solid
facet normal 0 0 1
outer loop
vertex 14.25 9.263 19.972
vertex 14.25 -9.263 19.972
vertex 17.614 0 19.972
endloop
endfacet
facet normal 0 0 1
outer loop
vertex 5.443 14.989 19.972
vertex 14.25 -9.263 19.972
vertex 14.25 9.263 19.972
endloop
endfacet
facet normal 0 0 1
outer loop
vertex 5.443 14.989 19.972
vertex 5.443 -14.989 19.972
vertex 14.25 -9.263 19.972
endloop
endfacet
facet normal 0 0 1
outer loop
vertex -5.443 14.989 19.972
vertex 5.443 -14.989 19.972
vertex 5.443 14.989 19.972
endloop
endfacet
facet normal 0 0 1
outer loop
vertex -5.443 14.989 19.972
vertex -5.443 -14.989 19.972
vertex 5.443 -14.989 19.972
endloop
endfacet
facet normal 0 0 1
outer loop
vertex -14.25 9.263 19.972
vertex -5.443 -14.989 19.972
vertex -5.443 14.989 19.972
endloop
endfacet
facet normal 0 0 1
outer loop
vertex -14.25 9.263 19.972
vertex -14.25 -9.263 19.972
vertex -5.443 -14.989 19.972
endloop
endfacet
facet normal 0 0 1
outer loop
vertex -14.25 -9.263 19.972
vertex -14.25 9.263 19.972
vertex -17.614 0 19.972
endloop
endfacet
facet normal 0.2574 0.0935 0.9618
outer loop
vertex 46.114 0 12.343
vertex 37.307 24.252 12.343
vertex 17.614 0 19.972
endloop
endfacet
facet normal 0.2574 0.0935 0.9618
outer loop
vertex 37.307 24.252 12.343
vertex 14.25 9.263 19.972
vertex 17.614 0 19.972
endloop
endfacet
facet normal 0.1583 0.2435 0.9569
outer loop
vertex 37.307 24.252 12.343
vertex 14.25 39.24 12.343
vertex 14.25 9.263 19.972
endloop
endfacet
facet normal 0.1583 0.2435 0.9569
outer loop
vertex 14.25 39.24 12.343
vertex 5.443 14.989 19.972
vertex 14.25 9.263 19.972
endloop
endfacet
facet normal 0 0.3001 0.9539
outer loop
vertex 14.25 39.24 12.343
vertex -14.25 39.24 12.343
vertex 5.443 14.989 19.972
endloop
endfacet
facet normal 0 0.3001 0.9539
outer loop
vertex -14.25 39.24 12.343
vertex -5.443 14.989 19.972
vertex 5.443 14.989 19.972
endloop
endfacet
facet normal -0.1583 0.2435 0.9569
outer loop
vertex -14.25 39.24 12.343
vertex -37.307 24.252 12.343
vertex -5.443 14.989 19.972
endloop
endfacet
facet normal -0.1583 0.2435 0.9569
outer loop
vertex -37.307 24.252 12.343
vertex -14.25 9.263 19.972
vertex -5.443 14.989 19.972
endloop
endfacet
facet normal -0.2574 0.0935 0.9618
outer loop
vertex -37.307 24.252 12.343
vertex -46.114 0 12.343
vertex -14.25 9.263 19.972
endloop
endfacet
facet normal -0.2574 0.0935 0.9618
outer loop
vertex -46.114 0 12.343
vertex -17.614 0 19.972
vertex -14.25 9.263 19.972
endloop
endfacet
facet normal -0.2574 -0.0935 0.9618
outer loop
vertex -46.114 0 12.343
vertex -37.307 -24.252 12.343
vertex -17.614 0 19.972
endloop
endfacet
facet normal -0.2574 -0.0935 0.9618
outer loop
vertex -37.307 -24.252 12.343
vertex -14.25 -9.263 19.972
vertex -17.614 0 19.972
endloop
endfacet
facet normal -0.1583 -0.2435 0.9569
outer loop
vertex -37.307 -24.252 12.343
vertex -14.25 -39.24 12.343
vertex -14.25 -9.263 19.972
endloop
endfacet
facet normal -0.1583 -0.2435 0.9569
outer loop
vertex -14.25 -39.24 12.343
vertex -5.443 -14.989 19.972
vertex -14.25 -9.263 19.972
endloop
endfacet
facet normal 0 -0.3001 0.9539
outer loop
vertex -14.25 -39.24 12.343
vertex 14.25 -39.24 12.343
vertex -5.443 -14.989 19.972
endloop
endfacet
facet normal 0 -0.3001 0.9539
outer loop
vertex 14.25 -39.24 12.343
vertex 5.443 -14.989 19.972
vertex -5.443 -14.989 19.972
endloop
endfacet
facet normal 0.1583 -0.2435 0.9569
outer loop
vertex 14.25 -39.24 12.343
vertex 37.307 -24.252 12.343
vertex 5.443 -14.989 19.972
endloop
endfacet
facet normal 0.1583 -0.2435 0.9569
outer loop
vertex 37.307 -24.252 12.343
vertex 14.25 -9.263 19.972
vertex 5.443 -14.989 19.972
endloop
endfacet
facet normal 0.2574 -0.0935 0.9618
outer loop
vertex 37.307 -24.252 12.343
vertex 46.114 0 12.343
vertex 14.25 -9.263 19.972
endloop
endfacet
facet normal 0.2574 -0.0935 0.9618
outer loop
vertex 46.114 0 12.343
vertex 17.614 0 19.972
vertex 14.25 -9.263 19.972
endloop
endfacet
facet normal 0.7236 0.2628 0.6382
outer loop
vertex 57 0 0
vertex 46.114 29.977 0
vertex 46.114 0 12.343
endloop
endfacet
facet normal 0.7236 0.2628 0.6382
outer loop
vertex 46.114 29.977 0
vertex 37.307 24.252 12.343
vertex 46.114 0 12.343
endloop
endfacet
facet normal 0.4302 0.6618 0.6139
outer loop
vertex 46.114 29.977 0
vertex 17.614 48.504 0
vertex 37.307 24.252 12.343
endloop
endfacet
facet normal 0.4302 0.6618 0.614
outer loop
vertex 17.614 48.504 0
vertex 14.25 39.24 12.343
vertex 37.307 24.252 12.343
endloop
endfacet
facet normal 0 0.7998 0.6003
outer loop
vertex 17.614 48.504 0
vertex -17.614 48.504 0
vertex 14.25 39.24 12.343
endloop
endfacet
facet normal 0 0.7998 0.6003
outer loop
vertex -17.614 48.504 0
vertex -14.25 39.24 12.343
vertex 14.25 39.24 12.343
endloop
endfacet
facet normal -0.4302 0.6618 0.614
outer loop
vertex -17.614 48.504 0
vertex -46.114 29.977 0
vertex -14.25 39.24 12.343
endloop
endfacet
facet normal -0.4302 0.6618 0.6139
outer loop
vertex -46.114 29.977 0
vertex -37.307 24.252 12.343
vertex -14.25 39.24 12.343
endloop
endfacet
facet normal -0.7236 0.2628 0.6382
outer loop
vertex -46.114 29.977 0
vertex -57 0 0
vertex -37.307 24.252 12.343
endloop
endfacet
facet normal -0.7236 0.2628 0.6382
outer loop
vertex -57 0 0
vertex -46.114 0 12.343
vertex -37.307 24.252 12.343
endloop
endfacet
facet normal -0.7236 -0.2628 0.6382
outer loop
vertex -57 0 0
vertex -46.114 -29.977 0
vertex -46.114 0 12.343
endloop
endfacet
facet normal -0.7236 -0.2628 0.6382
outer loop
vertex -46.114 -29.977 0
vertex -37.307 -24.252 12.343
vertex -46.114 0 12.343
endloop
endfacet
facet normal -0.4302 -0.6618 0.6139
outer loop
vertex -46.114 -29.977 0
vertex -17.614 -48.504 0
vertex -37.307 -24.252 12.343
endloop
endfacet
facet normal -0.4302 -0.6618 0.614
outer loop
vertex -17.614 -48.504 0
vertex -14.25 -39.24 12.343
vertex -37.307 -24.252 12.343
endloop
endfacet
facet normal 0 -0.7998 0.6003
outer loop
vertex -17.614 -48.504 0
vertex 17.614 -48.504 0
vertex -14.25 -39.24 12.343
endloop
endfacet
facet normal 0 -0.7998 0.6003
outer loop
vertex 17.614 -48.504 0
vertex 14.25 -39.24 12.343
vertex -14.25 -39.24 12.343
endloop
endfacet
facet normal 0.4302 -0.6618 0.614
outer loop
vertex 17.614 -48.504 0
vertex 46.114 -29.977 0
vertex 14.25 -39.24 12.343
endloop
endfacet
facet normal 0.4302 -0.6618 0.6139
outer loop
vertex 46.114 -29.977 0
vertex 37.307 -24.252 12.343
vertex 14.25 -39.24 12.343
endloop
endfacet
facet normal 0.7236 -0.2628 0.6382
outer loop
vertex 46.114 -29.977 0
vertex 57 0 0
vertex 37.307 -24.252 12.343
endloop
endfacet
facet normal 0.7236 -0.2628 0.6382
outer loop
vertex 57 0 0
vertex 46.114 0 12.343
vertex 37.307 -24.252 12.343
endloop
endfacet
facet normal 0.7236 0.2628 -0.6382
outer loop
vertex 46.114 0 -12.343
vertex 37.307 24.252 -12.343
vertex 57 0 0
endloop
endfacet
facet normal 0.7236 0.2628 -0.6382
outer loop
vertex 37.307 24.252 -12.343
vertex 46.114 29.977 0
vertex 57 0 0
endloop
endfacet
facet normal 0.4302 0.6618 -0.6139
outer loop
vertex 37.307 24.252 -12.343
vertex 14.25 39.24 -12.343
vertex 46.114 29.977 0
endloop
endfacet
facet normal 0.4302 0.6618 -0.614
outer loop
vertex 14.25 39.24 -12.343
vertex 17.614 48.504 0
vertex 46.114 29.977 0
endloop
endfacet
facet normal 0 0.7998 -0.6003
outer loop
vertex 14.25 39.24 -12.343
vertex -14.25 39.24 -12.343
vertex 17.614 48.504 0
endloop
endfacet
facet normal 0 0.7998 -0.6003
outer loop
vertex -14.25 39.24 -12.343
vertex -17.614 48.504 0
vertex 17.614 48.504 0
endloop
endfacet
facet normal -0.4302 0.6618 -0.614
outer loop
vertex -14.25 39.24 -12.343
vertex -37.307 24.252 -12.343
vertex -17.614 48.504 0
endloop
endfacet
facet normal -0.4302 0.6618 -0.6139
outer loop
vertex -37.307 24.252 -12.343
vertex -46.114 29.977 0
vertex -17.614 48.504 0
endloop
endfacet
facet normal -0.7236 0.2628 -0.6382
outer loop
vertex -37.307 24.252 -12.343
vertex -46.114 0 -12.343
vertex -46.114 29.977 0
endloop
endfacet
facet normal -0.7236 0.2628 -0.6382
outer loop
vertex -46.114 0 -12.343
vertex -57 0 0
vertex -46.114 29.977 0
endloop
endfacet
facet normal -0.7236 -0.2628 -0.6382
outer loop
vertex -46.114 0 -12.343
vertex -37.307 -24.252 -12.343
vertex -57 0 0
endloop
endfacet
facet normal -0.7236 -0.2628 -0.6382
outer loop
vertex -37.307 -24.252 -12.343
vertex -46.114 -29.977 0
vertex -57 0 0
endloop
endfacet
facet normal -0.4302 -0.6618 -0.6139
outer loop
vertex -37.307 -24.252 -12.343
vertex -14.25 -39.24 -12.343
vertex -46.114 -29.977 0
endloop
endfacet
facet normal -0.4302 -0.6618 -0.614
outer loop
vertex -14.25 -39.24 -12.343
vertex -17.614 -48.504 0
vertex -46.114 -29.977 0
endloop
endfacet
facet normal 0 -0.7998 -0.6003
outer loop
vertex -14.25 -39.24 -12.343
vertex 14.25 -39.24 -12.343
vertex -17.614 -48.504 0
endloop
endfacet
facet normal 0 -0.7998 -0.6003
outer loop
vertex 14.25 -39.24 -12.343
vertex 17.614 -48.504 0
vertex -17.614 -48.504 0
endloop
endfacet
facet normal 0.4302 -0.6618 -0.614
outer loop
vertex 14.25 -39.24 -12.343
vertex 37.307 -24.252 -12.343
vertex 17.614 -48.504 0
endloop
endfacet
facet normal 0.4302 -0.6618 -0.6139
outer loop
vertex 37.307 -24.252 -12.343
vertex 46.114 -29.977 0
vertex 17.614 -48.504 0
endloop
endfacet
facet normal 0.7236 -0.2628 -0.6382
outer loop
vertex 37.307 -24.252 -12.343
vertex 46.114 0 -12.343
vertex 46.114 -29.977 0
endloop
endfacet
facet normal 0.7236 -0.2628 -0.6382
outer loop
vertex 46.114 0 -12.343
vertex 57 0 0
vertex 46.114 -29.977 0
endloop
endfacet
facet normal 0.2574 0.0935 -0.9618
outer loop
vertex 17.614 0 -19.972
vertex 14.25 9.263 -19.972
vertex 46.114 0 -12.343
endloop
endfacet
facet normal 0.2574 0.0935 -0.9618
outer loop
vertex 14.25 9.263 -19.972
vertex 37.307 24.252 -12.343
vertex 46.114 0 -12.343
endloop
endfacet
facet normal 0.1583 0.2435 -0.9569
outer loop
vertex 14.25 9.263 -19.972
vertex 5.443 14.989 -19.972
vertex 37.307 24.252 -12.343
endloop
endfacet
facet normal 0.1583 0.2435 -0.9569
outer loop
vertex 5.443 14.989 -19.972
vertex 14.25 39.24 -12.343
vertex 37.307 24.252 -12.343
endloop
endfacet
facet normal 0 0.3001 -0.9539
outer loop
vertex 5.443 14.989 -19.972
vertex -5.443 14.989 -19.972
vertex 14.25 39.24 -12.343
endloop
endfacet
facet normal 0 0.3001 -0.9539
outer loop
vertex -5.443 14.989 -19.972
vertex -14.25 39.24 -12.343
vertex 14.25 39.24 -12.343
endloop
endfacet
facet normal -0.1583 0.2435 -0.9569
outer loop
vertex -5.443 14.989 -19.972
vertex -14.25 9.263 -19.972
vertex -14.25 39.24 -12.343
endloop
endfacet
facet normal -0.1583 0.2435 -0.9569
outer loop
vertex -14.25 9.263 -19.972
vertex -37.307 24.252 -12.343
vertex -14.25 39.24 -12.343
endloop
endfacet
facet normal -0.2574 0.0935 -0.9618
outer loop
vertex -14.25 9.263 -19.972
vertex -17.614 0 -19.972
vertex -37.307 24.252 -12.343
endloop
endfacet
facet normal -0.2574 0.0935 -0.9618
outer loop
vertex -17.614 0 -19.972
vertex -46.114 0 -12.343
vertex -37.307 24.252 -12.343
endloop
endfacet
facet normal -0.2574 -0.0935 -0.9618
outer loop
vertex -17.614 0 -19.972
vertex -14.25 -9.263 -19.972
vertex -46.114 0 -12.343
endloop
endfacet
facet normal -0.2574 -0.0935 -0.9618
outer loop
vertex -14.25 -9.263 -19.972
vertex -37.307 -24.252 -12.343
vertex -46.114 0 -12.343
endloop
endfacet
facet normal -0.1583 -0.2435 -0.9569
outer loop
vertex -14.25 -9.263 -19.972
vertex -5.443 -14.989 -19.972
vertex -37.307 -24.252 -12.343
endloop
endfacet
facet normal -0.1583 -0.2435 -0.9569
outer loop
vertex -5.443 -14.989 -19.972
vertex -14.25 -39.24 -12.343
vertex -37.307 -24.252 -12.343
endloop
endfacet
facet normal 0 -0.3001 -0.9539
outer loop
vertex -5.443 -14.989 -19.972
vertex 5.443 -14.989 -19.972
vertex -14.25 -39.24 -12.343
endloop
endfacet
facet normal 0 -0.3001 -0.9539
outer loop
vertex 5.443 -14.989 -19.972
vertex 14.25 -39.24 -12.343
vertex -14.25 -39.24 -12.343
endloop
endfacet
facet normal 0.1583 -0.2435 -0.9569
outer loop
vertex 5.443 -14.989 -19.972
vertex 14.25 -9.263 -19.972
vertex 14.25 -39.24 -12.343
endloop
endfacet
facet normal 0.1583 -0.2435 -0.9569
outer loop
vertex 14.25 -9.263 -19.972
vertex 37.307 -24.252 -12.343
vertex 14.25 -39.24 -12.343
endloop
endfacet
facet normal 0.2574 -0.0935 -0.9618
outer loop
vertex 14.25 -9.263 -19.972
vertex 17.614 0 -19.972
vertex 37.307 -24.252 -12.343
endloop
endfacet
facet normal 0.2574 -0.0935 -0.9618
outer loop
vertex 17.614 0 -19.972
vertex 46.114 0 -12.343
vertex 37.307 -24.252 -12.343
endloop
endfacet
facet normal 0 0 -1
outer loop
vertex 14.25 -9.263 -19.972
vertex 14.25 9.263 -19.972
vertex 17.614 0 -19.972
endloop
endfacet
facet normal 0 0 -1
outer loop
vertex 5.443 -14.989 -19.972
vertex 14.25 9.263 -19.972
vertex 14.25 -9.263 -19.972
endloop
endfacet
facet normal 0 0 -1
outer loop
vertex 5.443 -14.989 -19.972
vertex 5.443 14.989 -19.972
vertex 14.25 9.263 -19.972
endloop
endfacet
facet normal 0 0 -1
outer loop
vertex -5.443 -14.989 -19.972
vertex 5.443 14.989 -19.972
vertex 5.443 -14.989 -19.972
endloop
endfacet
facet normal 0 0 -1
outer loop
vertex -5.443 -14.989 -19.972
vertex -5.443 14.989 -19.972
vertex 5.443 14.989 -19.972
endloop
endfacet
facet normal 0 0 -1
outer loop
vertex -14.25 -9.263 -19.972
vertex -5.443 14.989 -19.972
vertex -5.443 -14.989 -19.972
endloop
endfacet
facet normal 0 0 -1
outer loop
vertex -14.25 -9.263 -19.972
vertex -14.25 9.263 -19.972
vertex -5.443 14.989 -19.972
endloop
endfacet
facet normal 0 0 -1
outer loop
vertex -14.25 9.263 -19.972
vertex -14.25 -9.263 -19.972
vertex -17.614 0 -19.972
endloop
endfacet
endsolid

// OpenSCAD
// Generated by SolidPython 1.0.1 on 2020-07-29 00:46:54


scale(v = [19, 17, 7]) {
	sphere(r = 3);
}
/***********************************************
*********      SolidPython code:      **********
************************************************
 
# import packages: SolidPython
from solid import *
from solid.utils import *
from itertools import chain, combinations, permutations


class Resize:

    def __init__(self, scad_file):
        self.scad_file = scad_file
        #self.scad_file = import_scad(scad_file)
        # cone/cylinder param:
        self.r1 = 0
        self.r2 = 0
        self.h = 0
        # rectangular prism param:
        self.w = 0
        self.l = 0
        # ellipse param:
        self.r = 0

    # import OpenScad code (file name corresponds to shape)


    # classify shape + parameters
    def assign(self, param1, param2, param3):
        if self.scad_file == 'cone.scad':
            self.r1 = param1
            self.r2 = param2
            self.h = param3
        elif self.scad_file == 'cylinder.scad':
            self.r1 = param1
            self.r2 = param2
            self.h = param3
        elif self.scad_file == 'rectangularPrism.scad':
            self.h = param1
            self.l = param2
            self.w = param3
        else:
            self.r = param1
            self.h = param2

    # resize parameters
    def iterate(self):
        x = range(3, 20, 2)
        i = 1
        if self.scad_file == 'cone.scad':
            tempList = list(permutations(x, 2))
            for temp in tempList:
                param1 = temp[0]
                param2 = temp[1]
                filepath = 'produced_scad_files/' + 'cone' + str(param1) + '_' + str(param2) + '_' + '.scad'
                scad_render_to_file(cylinder(h=param1, r1=param2, r2=0), filepath)

        elif self.scad_file == 'cylinder.scad':
            tempList = list(permutations(x, 3))
            for temp in tempList:
                param1 = temp[0]
                param2 = temp[1]
                filepath = 'produced_scad_files/' + 'cylinder' + str(param1) + '_' + str(param2) + '_' + '.scad'
                scad_render_to_file(cylinder(h=param1, r1=param2, r2=param2), filepath)

        elif self.scad_file == 'rectangularPrism.scad':
            tempList = list(permutations(x, 3))
            for temp in tempList:
                param1 = temp[0]
                param2 = temp[1]
                param3 = temp[2]
                filepath = 'produced_scad_files/' + 'rectangularPrism' + str(param1) + '_' + str(param2) + '_' + str(
                    param3) + '.scad'
                scad_render_to_file(cube(size=(param1, param2, param3)), filepath)

        elif self.scad_file == 'ellipse.scad':
            tempList = list(permutations(x, 4))
            for temp in tempList:
                param1 = temp[0]
                param2 = temp[1]
                param3 = temp[2]
                param4 = temp[3]
                filepath = 'produced_scad_files/' + 'ellipse' + str(param1) + '_' + str(param2) + '_' + str(param3) + '_' + str(param4) + '.scad'
                scad_render_to_file(scale([param1, param2, param3])(sphere(r=param4)), filepath)

    def render_to_scadfile(self):
        scad_render_to_file(scad, 'example.scad') 
 
************************************************/
